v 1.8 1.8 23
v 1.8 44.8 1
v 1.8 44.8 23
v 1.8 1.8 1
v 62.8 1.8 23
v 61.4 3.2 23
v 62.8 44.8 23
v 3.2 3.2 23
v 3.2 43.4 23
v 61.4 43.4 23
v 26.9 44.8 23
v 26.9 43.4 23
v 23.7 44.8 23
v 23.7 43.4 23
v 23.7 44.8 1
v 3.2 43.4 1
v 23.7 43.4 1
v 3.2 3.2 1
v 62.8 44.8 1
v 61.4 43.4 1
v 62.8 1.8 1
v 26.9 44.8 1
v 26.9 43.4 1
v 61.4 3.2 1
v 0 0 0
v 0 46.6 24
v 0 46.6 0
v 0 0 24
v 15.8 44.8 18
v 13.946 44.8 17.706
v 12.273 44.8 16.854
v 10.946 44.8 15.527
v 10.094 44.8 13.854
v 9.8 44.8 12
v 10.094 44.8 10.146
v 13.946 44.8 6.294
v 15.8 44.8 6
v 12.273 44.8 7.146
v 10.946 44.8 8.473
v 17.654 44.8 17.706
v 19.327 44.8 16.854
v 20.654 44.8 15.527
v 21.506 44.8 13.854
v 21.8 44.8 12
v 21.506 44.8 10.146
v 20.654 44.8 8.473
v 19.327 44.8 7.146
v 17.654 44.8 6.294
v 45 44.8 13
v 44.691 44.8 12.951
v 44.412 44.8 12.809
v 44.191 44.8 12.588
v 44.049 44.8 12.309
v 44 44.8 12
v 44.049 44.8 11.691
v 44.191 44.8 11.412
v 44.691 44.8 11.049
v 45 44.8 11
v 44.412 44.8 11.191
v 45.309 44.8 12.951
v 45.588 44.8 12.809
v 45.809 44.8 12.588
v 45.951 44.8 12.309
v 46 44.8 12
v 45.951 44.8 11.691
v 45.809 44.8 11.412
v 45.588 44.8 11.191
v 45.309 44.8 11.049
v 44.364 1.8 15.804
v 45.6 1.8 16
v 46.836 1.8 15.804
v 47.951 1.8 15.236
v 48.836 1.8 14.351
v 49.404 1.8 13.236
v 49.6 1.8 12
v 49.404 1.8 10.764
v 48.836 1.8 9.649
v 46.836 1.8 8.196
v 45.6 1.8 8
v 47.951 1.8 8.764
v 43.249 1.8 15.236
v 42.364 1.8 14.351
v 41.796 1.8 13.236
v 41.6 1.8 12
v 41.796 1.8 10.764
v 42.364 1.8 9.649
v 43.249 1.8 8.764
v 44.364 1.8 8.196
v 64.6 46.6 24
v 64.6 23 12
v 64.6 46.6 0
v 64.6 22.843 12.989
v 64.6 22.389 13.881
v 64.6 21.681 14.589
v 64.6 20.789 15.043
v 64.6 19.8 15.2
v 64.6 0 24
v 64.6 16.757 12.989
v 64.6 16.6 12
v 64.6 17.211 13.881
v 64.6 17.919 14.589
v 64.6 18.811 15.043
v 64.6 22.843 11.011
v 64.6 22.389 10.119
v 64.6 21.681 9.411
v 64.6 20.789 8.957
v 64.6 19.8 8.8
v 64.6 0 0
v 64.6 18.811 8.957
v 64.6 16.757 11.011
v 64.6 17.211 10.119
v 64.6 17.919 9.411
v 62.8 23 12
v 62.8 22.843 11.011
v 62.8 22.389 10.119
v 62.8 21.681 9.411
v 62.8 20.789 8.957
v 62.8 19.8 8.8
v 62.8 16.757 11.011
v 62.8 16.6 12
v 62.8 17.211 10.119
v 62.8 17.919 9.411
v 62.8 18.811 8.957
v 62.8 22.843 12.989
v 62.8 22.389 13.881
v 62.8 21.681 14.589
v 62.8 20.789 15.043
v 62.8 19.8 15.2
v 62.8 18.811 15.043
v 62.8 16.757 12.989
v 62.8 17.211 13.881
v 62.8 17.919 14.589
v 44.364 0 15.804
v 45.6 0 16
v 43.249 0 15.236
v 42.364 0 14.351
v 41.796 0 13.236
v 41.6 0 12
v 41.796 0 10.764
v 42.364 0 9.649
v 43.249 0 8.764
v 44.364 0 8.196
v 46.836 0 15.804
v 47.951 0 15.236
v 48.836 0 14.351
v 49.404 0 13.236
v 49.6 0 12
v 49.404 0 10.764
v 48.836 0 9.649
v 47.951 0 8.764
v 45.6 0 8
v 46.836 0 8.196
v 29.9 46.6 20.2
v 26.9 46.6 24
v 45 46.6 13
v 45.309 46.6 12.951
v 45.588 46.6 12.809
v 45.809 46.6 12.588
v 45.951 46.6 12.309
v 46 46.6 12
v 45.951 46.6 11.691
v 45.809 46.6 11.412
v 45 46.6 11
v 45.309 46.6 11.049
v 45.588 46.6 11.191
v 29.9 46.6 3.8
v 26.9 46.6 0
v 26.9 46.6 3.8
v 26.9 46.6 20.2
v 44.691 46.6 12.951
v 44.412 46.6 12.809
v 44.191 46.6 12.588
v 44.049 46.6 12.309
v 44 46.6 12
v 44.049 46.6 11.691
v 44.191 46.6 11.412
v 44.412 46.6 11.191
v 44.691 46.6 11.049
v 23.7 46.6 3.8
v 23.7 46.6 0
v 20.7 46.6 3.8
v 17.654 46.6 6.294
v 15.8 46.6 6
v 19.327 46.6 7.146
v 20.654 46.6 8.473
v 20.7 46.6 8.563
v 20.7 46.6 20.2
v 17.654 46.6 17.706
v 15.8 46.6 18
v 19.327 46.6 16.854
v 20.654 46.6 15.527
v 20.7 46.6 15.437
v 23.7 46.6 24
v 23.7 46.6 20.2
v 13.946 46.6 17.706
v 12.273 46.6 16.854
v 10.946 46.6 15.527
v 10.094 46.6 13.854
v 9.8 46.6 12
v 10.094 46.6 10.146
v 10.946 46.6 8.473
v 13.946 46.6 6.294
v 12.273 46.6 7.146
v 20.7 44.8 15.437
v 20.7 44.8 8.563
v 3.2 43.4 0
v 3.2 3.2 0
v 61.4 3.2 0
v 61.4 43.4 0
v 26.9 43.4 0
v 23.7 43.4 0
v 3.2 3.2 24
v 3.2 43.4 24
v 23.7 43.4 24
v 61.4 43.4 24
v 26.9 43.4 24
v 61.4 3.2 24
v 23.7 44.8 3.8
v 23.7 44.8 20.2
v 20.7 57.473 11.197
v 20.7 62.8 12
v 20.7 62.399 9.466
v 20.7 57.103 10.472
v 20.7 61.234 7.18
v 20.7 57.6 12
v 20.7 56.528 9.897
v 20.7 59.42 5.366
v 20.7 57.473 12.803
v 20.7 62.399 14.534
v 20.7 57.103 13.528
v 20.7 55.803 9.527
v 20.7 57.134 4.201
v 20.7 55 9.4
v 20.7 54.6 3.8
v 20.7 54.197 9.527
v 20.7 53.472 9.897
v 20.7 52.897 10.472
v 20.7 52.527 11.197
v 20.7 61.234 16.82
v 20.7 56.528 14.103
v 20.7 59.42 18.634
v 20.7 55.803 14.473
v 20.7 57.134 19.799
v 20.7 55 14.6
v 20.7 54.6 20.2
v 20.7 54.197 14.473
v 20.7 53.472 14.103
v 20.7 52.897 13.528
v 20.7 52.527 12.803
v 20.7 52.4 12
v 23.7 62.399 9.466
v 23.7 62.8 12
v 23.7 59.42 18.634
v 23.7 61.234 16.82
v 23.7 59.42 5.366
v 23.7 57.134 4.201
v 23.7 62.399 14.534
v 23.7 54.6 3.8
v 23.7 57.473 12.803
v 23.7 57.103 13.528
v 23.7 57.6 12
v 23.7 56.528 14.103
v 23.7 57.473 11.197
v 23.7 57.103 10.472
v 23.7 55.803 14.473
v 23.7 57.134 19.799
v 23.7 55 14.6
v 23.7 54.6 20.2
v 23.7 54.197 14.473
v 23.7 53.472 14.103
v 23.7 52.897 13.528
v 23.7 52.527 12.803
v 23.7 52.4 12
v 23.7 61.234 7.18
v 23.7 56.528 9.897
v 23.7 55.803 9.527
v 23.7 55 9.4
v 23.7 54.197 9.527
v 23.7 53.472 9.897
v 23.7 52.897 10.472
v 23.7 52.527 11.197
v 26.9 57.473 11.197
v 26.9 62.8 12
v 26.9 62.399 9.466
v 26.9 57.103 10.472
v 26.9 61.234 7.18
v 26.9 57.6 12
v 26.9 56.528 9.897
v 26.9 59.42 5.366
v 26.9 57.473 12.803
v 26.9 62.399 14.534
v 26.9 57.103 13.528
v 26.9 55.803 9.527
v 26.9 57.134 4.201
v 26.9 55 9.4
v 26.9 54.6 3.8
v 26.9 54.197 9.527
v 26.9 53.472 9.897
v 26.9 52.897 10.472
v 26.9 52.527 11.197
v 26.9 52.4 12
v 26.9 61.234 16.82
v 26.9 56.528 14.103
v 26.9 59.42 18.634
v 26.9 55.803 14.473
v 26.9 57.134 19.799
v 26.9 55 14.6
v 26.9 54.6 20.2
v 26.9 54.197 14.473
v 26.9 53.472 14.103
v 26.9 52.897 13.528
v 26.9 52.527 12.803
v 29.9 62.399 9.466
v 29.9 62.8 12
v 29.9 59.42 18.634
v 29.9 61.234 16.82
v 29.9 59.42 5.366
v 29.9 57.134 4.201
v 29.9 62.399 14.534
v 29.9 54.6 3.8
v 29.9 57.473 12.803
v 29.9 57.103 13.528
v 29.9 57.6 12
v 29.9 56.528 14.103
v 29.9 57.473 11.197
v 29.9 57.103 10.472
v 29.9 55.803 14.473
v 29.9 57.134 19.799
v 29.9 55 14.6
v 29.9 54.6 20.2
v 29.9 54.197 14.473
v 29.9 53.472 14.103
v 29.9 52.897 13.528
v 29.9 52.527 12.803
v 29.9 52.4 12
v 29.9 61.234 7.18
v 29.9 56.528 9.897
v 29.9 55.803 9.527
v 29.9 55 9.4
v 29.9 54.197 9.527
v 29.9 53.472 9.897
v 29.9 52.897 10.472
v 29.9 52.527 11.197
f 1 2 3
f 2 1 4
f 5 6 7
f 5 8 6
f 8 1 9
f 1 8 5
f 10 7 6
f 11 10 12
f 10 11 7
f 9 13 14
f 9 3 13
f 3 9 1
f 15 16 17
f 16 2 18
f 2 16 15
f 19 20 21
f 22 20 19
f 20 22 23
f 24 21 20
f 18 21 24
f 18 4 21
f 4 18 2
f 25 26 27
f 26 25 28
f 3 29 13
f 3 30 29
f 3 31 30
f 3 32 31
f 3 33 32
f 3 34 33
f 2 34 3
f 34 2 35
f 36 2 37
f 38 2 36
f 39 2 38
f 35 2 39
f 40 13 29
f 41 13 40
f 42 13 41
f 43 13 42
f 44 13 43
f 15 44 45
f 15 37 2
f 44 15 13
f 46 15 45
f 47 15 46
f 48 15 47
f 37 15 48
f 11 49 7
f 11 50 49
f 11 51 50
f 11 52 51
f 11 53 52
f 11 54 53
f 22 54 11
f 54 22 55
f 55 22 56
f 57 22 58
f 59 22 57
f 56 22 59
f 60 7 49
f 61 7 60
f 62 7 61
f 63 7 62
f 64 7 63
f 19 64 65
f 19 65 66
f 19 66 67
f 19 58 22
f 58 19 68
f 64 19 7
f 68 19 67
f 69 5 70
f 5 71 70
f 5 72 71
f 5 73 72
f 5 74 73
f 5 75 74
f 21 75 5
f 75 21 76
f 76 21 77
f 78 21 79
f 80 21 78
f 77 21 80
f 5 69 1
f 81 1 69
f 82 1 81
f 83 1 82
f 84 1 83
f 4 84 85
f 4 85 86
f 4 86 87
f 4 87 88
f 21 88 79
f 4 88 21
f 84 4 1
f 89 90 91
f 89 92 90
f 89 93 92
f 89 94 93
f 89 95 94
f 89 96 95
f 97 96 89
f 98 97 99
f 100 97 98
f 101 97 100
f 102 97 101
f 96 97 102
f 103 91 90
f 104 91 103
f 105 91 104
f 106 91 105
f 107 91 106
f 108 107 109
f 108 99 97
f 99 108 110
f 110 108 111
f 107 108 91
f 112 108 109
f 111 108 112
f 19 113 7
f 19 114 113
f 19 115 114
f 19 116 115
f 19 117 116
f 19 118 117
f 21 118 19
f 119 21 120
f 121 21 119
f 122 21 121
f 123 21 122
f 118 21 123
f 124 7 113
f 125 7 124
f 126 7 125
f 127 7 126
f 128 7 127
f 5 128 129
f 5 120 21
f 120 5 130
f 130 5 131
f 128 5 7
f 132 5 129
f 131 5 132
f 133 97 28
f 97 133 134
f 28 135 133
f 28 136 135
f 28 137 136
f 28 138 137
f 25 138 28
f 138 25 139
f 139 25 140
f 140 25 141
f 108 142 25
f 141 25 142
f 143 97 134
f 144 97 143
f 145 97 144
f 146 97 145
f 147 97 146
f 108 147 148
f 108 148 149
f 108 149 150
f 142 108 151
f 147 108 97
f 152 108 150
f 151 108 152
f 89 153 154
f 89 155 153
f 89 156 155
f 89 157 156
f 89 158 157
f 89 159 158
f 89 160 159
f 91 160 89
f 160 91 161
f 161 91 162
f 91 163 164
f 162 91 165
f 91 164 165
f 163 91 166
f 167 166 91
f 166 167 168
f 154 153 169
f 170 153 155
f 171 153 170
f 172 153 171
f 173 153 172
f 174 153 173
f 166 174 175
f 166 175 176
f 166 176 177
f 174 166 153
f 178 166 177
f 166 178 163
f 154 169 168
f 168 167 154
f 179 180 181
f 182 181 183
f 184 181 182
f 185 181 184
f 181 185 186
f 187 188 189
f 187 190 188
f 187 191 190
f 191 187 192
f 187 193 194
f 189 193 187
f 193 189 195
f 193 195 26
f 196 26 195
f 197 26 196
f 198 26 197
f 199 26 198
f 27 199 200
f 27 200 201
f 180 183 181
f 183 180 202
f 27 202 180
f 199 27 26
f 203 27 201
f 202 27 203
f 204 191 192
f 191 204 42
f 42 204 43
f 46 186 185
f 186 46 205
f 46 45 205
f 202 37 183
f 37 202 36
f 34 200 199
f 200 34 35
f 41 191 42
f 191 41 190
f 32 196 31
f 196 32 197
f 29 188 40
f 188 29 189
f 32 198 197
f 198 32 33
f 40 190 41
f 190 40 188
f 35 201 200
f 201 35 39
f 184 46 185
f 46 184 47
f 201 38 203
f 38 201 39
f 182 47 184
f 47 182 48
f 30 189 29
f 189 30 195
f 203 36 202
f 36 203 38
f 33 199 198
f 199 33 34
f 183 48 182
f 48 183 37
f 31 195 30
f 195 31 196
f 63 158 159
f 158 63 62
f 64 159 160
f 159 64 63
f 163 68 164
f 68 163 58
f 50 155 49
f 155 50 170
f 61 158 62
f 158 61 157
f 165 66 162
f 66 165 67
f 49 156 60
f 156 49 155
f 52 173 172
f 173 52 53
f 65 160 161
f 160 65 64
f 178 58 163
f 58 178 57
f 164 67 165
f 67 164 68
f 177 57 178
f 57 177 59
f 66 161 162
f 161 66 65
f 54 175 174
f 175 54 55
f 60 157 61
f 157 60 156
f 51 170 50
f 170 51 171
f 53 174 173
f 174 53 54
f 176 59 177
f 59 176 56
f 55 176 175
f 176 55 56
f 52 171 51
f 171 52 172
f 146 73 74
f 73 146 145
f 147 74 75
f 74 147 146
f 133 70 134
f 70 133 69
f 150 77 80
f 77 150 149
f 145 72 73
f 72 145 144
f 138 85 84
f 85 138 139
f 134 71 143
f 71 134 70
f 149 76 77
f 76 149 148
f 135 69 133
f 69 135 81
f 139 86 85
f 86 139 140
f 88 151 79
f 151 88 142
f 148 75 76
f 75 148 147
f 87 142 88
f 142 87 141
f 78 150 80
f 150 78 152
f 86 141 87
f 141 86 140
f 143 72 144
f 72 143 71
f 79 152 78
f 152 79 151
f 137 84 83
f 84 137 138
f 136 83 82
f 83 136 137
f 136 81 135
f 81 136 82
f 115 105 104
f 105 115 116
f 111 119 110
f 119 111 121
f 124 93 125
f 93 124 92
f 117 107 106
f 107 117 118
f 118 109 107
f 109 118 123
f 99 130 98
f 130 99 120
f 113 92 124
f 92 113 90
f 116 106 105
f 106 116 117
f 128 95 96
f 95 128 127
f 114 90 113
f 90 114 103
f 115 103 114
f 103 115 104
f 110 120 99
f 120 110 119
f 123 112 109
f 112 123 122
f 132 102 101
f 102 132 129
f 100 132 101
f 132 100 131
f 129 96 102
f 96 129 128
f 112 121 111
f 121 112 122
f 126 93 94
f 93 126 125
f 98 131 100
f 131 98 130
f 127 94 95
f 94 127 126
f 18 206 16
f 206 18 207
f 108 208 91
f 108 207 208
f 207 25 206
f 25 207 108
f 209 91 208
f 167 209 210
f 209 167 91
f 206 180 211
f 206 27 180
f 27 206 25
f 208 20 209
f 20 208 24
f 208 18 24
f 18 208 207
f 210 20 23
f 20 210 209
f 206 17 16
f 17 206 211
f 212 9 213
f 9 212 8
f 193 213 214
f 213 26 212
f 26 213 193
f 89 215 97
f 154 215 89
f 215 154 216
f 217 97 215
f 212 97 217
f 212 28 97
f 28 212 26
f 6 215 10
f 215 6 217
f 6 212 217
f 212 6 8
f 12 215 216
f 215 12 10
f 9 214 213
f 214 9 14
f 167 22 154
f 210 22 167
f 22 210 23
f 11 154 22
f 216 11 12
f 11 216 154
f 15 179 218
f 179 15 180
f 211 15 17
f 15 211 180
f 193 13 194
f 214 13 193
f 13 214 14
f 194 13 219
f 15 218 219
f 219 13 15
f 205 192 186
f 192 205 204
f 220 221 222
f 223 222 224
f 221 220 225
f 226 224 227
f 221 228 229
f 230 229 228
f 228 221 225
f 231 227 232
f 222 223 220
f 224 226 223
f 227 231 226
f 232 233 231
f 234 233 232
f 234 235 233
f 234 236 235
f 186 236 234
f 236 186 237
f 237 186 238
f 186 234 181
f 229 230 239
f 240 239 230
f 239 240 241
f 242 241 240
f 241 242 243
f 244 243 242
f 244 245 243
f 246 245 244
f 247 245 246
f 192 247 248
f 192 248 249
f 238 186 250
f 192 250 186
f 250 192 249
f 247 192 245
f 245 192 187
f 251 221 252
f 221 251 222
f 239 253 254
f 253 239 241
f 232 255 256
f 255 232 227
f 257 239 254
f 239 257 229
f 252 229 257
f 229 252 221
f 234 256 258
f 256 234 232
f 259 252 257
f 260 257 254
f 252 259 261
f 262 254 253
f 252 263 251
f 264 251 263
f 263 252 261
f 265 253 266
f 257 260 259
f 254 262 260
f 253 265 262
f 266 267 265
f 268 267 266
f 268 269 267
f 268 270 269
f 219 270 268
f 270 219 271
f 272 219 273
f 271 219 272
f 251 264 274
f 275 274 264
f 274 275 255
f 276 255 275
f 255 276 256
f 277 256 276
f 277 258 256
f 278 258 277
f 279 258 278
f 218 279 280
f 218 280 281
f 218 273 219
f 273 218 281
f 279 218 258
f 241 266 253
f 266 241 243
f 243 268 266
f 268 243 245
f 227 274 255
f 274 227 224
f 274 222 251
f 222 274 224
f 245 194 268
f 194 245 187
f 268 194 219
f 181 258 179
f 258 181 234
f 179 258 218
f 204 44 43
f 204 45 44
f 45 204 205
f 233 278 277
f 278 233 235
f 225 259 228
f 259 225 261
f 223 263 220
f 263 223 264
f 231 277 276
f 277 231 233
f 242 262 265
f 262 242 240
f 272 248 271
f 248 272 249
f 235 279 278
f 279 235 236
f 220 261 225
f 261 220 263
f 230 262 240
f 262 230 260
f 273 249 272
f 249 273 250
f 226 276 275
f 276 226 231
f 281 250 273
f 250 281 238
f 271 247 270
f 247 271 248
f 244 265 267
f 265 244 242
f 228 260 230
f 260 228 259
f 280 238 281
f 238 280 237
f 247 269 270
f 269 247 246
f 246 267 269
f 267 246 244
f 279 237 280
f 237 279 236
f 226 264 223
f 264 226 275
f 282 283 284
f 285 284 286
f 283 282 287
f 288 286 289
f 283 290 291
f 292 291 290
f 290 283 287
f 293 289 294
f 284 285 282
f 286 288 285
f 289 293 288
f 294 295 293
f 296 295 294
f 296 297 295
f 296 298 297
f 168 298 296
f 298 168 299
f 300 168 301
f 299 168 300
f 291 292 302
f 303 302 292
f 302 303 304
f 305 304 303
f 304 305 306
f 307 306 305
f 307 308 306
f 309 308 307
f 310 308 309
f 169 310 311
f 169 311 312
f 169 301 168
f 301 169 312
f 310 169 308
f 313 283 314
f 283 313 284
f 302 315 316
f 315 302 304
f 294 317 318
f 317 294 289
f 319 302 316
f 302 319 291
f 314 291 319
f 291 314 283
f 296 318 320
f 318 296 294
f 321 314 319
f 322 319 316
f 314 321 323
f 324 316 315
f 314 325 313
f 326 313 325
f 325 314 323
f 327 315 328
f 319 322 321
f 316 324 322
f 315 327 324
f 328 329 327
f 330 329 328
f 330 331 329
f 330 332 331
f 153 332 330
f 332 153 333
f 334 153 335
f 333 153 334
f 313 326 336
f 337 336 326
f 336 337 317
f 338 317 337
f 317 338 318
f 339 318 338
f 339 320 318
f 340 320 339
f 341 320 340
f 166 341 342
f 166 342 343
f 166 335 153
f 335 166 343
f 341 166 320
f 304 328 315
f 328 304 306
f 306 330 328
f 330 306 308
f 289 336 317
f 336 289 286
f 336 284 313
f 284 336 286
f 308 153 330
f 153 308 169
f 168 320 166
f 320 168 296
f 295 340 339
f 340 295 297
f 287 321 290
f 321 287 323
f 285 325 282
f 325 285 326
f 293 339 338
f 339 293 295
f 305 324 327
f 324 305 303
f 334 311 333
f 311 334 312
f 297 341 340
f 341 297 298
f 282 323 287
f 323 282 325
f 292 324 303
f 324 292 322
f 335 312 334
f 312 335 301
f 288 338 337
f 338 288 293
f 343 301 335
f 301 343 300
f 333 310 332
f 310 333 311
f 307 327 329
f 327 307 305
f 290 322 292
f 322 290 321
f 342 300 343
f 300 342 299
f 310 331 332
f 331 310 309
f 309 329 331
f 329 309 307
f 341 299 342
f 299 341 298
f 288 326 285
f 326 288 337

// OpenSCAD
/*
 * Created by:
 * Thomas Buck <xythobuz@xythobuz.de> in May 2016
 *
 * Licensed under the
 * Creative Commons - Attribution - Share Alike license.
 */

// -----------------------------------------------------------

cam_width = 61; // 60.5
cam_depth = 22; // 21.3
cam_height = 43; // 42.1

button_size = 12;
button_dist = 14;

mic_hole = 2;
mic_hole_dist = 17.8;

bottom_hole = 8;
bottom_hole_dist = 17.2;

wifi_hole = 6.4;
wifi_hole_dist = 18;

mount_width = 3; // 3.1
mount_gap = 3.2; // 3.1
mount_depth = 16.4; // 16.4
mount_height = 16.2; // 16.1
mount_hole = 5.2; // 5
mount_hole_dist = 7.8; // 7.7
mount_offset = -7; // -7

wall_size = 1.8;
lip_height = 1;
lip_width = 1.4;

$fn = 20;

// -----------------------------------------------------------

module half_cylinder(d, h) {
    rotate([0, 0, 180])
    difference() {
        cylinder(d = d, h = h);
        translate([-(d / 2), 0, -1])
            cube([d, d / 2, h + 2]);
    }
}

module frame() {
    // left wall
    translate([0, wall_size, 0])
        cube([wall_size, cam_height, cam_depth]);
    
    // right wall
    translate([wall_size + cam_width, wall_size, 0])
        cube([wall_size, cam_height, cam_depth]);
    
    // bottom wall
    cube([cam_width + (2 * wall_size), wall_size, cam_depth]);
    
    // top wall
    translate([0, wall_size + cam_height, 0])
        cube([cam_width + (2 * wall_size), wall_size, cam_depth]);
}

module frameWithButton() {
    difference() {
        frame();
        
        // button
        translate([wall_size + button_dist, (2 * wall_size) + cam_height + 1, cam_depth / 2])
            rotate([90, 0, 0])
            cylinder(d = button_size, h = wall_size + 2);
        
        // mic hole
        translate([wall_size + cam_width - mic_hole_dist, (2 * wall_size) + cam_height + 1, cam_depth / 2])
            rotate([90, 0, 0])
            cylinder(d = mic_hole, h = wall_size + 2);
        
        // bottom hole
        translate([wall_size + cam_width - bottom_hole_dist, wall_size + 1, cam_depth / 2])
            rotate([90, 0, 0])
            cylinder(d = bottom_hole, h = wall_size + 2);
        
        // wifi hole
        translate([wall_size + cam_width - 1, wall_size + wifi_hole_dist, cam_depth / 2])
            rotate([0, 90, 0])
            cylinder(d = wifi_hole, h = wall_size + 2);
    }
}

module lip() {
    // left lip
    translate([0, wall_size, 0])
        cube([wall_size + lip_width, cam_height, lip_height]);
    
    // right lip
    translate([wall_size + cam_width - lip_width, wall_size, 0])
        cube([wall_size + lip_width, cam_height, lip_height]);
    
    // bottom lip
    cube([cam_width + (2 * wall_size), wall_size + lip_width, lip_height]);
    
    // top lip
    translate([0, wall_size + cam_height - lip_width, 0])
        cube([cam_width + (2 * wall_size), wall_size + lip_width, lip_height]);
}

module frameLips() {
    translate([0, 0, lip_height])
        frameWithButton();
    
    lip();
    
    translate([0, 0, cam_depth + lip_height])
        lip();
}

module mountArm() {
    difference() {
        union() {
            translate([0, mount_height - (mount_depth / 2), 0])
                rotate([0, 90, 0])
                half_cylinder(mount_depth, mount_width);
            
            translate([0, -wall_size, -(mount_depth / 2)])
                cube([mount_width, mount_height - (mount_depth / 2) + wall_size, mount_depth]);
        }
        
        translate([-1, mount_height - mount_hole_dist, 0])
            rotate([0, 90, 0])
            cylinder(d = mount_hole, h = mount_width + 2);
    }
}

module mount() {
    mountArm();
    
    translate([mount_width + mount_gap, 0, 0])
        mountArm();
}

module cover() {
    difference() {
        frameLips();
        translate([wall_size + ((cam_width - (mount_gap + (2 * mount_width))) / 2) + mount_offset + mount_width, wall_size + cam_height - lip_width - 1, -1])
            cube([mount_gap, wall_size + lip_width + 2, cam_depth + (2 * lip_height) + 2]);
    }

    translate([wall_size + ((cam_width - (mount_gap + (2 * mount_width))) / 2) + mount_offset, (2 * wall_size) + cam_height, lip_height + (cam_depth / 2)])
        mount();
}

// -----------------------------------------------------------

cover();
